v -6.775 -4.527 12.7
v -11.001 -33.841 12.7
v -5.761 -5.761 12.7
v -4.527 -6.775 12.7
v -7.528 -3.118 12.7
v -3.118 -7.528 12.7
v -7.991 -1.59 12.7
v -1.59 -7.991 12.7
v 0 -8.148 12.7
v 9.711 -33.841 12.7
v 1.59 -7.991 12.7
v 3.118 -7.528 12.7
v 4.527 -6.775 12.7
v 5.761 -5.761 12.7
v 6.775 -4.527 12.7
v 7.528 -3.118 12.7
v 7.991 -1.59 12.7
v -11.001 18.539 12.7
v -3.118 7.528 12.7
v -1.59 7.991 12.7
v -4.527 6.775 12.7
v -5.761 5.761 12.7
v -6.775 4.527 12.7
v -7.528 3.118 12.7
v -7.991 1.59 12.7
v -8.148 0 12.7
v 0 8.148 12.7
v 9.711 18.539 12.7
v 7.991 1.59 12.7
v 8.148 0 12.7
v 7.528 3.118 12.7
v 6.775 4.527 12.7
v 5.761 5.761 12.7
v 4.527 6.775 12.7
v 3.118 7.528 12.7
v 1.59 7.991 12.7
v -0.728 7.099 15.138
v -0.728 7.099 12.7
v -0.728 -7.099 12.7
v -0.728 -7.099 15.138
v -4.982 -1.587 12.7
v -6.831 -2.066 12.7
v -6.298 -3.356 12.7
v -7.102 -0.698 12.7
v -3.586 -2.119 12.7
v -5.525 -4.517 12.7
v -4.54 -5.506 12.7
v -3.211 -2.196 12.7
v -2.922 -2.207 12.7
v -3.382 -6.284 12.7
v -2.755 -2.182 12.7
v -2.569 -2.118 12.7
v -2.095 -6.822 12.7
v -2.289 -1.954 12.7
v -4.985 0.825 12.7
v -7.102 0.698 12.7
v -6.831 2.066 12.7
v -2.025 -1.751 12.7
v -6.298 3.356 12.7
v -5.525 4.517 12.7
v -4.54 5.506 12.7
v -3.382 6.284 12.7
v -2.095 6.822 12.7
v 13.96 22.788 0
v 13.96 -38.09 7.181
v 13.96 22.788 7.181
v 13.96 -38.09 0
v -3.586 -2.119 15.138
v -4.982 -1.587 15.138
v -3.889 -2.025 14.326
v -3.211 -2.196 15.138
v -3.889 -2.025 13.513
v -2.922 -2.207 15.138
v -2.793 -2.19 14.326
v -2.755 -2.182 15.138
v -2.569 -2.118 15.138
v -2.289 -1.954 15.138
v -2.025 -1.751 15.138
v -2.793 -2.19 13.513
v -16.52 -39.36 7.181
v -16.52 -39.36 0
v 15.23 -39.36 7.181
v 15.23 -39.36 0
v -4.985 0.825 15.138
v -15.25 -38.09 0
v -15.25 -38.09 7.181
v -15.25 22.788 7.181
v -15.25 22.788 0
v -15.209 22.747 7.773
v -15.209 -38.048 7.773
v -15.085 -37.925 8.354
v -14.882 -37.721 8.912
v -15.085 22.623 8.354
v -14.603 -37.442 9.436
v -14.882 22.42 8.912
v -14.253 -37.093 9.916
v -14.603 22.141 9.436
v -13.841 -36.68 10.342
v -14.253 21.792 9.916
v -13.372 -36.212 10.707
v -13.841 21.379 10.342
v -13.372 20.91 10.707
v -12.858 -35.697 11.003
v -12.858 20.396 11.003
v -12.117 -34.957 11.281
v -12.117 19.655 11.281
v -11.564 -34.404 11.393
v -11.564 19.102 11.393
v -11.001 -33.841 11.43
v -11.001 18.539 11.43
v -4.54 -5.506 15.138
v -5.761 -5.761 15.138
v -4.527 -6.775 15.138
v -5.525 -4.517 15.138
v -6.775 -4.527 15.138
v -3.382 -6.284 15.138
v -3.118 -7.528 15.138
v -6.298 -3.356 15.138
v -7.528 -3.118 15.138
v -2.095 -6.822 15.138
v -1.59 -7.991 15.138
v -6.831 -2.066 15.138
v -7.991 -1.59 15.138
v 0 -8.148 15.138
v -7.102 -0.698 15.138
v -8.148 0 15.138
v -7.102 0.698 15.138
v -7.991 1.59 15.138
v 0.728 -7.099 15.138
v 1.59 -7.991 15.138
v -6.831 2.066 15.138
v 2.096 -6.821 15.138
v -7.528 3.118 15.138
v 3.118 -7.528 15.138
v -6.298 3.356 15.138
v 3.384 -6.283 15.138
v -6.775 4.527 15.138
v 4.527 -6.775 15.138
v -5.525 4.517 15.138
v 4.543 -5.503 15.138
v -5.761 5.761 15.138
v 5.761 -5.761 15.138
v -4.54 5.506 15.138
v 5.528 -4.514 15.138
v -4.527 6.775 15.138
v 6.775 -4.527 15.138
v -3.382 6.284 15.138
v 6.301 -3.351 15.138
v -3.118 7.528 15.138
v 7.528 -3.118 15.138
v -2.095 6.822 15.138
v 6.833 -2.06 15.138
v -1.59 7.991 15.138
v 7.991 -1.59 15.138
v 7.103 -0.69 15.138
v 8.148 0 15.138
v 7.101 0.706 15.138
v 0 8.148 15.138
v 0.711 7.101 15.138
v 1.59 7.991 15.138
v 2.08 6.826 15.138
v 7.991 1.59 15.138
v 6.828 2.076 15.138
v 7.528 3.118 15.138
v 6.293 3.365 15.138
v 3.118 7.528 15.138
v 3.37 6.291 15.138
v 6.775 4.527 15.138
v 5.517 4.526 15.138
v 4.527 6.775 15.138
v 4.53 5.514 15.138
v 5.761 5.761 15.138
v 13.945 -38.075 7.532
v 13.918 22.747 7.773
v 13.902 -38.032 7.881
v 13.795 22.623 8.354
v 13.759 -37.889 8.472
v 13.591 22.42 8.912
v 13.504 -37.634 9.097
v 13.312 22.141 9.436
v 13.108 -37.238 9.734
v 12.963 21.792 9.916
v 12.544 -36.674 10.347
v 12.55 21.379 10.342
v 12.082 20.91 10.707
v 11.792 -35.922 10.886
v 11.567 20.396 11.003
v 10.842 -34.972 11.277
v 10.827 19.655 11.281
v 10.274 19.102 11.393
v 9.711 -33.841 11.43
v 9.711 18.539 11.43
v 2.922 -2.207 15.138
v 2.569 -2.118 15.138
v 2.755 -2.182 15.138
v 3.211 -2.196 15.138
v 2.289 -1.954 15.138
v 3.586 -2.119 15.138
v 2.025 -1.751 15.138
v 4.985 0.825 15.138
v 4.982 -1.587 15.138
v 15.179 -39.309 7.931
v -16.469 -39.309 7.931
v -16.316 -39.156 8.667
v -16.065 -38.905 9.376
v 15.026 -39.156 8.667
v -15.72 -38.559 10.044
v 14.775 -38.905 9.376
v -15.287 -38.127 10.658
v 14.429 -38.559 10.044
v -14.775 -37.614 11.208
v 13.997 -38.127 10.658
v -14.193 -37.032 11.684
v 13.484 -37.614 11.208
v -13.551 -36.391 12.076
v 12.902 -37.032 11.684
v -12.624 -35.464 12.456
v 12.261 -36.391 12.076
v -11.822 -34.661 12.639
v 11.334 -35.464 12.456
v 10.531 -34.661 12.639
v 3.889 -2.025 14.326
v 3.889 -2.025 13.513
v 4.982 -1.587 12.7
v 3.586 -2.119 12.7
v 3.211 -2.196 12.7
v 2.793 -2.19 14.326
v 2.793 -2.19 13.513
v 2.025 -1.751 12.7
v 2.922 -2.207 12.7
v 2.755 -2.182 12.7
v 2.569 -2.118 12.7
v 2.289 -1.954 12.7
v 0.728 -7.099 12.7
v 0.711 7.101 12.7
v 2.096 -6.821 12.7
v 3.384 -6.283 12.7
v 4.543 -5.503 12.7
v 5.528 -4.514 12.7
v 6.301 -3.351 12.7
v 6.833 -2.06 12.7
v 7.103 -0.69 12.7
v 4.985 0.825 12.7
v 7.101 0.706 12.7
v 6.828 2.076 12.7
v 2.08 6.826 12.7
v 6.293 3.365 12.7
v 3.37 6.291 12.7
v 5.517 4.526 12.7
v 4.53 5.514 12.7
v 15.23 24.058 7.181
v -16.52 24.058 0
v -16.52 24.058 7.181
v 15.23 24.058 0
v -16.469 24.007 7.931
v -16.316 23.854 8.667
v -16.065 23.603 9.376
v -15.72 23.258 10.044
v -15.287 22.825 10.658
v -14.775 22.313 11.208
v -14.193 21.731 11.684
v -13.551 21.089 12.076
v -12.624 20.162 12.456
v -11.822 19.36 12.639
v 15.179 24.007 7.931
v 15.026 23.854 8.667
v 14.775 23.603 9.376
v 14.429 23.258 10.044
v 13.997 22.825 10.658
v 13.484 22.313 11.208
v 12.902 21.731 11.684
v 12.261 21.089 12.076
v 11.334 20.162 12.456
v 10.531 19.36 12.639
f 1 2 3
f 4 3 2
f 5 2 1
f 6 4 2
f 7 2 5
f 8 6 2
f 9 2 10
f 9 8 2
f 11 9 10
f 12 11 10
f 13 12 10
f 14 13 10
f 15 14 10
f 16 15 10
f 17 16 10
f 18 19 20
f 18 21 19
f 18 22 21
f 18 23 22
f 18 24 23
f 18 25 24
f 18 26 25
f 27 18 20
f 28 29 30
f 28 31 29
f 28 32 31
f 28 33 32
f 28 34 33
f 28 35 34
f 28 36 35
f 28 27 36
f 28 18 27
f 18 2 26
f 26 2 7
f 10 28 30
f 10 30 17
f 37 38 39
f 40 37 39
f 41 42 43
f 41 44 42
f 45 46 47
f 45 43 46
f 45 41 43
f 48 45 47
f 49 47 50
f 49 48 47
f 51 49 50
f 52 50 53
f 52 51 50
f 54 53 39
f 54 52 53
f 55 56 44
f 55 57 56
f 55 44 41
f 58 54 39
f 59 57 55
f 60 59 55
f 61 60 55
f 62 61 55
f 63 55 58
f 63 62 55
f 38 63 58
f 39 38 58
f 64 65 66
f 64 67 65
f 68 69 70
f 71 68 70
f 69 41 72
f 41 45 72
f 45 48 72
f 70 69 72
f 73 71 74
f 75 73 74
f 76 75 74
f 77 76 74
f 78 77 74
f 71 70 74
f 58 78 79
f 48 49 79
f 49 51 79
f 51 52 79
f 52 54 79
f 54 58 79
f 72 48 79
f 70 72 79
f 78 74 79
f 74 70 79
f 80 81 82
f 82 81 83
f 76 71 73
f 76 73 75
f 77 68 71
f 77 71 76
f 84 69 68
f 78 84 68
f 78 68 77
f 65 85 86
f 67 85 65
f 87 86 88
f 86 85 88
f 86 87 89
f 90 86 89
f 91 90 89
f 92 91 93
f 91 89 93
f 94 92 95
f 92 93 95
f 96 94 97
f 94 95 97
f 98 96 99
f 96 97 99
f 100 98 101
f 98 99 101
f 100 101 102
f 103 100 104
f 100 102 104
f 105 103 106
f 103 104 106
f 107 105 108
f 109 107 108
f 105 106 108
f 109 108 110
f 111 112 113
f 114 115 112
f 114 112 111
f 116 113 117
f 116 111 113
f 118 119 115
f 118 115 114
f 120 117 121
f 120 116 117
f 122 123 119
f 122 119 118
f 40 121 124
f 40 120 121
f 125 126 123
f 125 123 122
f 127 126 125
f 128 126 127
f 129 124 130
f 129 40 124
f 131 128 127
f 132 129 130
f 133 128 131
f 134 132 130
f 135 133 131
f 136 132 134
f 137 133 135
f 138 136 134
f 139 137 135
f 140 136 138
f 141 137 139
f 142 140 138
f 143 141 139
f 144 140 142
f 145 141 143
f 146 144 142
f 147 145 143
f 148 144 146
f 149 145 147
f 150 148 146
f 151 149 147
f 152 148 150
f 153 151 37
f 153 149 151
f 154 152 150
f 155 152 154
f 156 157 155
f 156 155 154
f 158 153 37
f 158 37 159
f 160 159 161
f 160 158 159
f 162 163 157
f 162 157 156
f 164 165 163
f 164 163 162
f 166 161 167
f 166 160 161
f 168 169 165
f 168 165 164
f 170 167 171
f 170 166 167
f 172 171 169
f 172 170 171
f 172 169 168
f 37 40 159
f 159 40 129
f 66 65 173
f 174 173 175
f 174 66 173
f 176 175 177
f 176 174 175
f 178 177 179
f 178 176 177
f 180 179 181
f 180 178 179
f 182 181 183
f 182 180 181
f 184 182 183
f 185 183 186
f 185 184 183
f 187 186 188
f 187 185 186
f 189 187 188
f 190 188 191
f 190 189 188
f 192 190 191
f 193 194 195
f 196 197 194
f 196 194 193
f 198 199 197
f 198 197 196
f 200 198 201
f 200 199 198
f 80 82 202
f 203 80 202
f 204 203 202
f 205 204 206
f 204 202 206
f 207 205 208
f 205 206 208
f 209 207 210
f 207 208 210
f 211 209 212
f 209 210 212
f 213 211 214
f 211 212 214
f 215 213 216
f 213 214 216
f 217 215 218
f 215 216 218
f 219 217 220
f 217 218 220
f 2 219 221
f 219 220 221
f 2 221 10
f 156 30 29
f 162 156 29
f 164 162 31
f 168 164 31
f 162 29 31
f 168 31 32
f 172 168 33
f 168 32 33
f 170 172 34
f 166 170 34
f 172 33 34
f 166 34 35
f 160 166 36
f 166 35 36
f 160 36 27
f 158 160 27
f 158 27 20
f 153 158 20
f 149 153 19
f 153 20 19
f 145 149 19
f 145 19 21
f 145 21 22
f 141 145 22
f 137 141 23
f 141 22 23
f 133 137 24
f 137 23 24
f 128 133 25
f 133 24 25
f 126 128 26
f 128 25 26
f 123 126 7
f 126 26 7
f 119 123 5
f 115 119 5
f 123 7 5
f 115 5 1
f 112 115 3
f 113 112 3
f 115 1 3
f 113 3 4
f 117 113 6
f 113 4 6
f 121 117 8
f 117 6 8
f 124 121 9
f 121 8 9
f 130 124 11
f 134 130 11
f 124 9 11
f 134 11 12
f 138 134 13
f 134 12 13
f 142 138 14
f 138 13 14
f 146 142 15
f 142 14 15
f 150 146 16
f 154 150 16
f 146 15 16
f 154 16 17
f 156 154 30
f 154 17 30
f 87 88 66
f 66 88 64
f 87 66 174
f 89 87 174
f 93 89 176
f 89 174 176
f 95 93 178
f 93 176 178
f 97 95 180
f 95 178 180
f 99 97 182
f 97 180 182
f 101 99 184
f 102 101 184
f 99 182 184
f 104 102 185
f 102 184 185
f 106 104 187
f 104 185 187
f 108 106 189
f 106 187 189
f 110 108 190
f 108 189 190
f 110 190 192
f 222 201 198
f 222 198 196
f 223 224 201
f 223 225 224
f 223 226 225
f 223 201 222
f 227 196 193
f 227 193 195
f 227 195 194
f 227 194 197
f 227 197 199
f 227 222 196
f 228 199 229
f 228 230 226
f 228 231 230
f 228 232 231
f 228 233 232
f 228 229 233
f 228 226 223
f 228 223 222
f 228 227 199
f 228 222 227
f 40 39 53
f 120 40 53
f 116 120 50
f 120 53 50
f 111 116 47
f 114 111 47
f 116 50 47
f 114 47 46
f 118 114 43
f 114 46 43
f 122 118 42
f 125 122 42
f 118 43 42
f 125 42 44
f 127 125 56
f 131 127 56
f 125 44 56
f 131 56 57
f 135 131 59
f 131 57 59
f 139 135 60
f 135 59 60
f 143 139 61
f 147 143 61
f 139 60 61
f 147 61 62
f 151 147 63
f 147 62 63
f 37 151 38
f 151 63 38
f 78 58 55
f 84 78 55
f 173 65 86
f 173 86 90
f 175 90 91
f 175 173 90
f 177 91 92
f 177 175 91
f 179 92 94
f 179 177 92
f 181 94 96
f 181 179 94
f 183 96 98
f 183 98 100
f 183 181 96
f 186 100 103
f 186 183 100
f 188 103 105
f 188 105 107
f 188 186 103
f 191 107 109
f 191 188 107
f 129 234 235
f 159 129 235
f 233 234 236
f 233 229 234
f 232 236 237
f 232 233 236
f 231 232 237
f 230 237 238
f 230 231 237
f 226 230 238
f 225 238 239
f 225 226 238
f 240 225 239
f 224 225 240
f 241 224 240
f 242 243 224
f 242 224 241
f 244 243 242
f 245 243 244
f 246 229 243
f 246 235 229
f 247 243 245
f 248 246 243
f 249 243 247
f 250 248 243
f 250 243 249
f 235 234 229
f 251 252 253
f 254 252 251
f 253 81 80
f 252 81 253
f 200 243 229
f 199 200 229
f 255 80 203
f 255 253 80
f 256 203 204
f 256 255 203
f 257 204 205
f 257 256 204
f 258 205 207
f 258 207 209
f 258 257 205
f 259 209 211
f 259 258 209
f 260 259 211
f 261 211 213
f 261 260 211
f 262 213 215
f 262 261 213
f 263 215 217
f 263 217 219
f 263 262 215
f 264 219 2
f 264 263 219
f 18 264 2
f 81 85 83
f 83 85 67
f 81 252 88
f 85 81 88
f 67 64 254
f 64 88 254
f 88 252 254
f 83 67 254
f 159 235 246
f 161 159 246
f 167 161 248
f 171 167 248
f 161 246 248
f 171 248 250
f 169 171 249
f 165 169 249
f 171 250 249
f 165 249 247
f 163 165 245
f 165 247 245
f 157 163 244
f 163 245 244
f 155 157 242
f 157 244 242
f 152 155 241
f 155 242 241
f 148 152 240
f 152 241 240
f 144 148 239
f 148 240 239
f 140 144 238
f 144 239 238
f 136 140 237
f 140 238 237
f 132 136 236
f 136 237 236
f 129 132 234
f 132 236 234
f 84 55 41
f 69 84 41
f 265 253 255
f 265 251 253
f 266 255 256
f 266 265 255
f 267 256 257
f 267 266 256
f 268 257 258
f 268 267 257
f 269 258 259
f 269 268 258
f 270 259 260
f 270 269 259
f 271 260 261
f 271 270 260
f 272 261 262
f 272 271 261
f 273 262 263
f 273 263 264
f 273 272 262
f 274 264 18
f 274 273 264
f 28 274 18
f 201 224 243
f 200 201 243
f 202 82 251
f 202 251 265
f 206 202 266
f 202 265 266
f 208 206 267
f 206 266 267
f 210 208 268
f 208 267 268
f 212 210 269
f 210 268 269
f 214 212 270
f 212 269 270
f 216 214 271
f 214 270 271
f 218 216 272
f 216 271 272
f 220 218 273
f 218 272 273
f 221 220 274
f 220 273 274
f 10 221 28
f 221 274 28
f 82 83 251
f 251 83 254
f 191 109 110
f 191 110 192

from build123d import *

# Parameters (mm, degrees)
F0_W     = 31.75
F0_H     = 63.4180661291
F1_DEPTH = 12.7
F2_R     = 5.5188922036
F3_T     = -1.27
F4_R     = 8.1477804886
F5_DEPTH = 2.4384


with BuildPart() as f1:
    # F0 (on Top) → F1 (new body)
    with BuildSketch(Plane.XY):
        with Locations((-0.6452417001, -7.6507264748)):
            Rectangle(F0_W, F0_H)
    extrude(amount=F1_DEPTH)

    # F2
    f2_edges = [f1.edges().sort_by_distance(p)[0] for p in [
        (-16.520242, -7.650726, 12.7),
        (-0.645242, -39.35976, 12.7),
        (15.229758, -7.650726, 12.7),
        (-0.645242, 24.058307, 12.7),
    ]]
    fillet(f2_edges, radius=F2_R)

    # F3
    f3_openings = [f1.faces().sort_by_distance(p)[0] for p in [
        (-0.645242, -7.650726, 0),
    ]]
    offset(amount=F3_T, openings=f3_openings)

    # F4 (on face) → F5 (join)
    with BuildSketch(Plane.XY.offset(12.7)):
        Circle(F4_R)
        with BuildLine():
            ThreePointArc((-0.7278024156, -7.0990652471), (-7.1362752006, 0), (-0.7278024156, 7.0990652471))
            Line((-0.7278024156, 7.0990652471), (-0.7278024156, -7.0990652471))
        make_face(mode=Mode.SUBTRACT)
        with BuildLine():
            Line((0.7278024156, -7.0990652471), (0.7113547333, 7.1007322285))
            ThreePointArc((0.7113547333, 7.1007322285), (7.1362704133, 0.0082659706), (0.7278024156, -7.0990652471))
        make_face(mode=Mode.SUBTRACT)
        with BuildLine():
            add(Edge.make_bspline(
                [(-4.9823397783, -1.5874156443), (-4.6270242199, -1.7415742797), (-3.9270228794, -2.0452796731), (-2.765918201, -2.34592671), (-2.2627830963, -1.941959242), (-2.0254463889, -1.7514014617)],
                knots=[0, 0, 0, 0, 0.3525731836, 0.6945986327, 1, 1, 1, 1], degree=3))
            Line((-2.0254463889, -1.7514014617), (-4.9851336516, 0.8246224024))
            Line((-4.9851336516, 0.8246224024), (-4.9823397783, -1.5874156443))
        make_face()
        with BuildLine():
            Line((4.9851336516, 0.8246224024), (2.0254463889, -1.7514014617))
            add(Edge.make_bspline(
                [(4.9823397783, -1.5874156443), (4.6270242199, -1.7415742797), (3.9270228794, -2.0452796731), (2.765918201, -2.34592671), (2.2627830963, -1.941959242), (2.0254463889, -1.7514014617)],
                knots=[0, 0, 0, 0, 0.3525731836, 0.6945986327, 1, 1, 1, 1], degree=3))
            Line((4.9823397783, -1.5874156443), (4.9851336516, 0.8246224024))
        make_face()
    extrude(amount=F5_DEPTH)


solid = f1.part
